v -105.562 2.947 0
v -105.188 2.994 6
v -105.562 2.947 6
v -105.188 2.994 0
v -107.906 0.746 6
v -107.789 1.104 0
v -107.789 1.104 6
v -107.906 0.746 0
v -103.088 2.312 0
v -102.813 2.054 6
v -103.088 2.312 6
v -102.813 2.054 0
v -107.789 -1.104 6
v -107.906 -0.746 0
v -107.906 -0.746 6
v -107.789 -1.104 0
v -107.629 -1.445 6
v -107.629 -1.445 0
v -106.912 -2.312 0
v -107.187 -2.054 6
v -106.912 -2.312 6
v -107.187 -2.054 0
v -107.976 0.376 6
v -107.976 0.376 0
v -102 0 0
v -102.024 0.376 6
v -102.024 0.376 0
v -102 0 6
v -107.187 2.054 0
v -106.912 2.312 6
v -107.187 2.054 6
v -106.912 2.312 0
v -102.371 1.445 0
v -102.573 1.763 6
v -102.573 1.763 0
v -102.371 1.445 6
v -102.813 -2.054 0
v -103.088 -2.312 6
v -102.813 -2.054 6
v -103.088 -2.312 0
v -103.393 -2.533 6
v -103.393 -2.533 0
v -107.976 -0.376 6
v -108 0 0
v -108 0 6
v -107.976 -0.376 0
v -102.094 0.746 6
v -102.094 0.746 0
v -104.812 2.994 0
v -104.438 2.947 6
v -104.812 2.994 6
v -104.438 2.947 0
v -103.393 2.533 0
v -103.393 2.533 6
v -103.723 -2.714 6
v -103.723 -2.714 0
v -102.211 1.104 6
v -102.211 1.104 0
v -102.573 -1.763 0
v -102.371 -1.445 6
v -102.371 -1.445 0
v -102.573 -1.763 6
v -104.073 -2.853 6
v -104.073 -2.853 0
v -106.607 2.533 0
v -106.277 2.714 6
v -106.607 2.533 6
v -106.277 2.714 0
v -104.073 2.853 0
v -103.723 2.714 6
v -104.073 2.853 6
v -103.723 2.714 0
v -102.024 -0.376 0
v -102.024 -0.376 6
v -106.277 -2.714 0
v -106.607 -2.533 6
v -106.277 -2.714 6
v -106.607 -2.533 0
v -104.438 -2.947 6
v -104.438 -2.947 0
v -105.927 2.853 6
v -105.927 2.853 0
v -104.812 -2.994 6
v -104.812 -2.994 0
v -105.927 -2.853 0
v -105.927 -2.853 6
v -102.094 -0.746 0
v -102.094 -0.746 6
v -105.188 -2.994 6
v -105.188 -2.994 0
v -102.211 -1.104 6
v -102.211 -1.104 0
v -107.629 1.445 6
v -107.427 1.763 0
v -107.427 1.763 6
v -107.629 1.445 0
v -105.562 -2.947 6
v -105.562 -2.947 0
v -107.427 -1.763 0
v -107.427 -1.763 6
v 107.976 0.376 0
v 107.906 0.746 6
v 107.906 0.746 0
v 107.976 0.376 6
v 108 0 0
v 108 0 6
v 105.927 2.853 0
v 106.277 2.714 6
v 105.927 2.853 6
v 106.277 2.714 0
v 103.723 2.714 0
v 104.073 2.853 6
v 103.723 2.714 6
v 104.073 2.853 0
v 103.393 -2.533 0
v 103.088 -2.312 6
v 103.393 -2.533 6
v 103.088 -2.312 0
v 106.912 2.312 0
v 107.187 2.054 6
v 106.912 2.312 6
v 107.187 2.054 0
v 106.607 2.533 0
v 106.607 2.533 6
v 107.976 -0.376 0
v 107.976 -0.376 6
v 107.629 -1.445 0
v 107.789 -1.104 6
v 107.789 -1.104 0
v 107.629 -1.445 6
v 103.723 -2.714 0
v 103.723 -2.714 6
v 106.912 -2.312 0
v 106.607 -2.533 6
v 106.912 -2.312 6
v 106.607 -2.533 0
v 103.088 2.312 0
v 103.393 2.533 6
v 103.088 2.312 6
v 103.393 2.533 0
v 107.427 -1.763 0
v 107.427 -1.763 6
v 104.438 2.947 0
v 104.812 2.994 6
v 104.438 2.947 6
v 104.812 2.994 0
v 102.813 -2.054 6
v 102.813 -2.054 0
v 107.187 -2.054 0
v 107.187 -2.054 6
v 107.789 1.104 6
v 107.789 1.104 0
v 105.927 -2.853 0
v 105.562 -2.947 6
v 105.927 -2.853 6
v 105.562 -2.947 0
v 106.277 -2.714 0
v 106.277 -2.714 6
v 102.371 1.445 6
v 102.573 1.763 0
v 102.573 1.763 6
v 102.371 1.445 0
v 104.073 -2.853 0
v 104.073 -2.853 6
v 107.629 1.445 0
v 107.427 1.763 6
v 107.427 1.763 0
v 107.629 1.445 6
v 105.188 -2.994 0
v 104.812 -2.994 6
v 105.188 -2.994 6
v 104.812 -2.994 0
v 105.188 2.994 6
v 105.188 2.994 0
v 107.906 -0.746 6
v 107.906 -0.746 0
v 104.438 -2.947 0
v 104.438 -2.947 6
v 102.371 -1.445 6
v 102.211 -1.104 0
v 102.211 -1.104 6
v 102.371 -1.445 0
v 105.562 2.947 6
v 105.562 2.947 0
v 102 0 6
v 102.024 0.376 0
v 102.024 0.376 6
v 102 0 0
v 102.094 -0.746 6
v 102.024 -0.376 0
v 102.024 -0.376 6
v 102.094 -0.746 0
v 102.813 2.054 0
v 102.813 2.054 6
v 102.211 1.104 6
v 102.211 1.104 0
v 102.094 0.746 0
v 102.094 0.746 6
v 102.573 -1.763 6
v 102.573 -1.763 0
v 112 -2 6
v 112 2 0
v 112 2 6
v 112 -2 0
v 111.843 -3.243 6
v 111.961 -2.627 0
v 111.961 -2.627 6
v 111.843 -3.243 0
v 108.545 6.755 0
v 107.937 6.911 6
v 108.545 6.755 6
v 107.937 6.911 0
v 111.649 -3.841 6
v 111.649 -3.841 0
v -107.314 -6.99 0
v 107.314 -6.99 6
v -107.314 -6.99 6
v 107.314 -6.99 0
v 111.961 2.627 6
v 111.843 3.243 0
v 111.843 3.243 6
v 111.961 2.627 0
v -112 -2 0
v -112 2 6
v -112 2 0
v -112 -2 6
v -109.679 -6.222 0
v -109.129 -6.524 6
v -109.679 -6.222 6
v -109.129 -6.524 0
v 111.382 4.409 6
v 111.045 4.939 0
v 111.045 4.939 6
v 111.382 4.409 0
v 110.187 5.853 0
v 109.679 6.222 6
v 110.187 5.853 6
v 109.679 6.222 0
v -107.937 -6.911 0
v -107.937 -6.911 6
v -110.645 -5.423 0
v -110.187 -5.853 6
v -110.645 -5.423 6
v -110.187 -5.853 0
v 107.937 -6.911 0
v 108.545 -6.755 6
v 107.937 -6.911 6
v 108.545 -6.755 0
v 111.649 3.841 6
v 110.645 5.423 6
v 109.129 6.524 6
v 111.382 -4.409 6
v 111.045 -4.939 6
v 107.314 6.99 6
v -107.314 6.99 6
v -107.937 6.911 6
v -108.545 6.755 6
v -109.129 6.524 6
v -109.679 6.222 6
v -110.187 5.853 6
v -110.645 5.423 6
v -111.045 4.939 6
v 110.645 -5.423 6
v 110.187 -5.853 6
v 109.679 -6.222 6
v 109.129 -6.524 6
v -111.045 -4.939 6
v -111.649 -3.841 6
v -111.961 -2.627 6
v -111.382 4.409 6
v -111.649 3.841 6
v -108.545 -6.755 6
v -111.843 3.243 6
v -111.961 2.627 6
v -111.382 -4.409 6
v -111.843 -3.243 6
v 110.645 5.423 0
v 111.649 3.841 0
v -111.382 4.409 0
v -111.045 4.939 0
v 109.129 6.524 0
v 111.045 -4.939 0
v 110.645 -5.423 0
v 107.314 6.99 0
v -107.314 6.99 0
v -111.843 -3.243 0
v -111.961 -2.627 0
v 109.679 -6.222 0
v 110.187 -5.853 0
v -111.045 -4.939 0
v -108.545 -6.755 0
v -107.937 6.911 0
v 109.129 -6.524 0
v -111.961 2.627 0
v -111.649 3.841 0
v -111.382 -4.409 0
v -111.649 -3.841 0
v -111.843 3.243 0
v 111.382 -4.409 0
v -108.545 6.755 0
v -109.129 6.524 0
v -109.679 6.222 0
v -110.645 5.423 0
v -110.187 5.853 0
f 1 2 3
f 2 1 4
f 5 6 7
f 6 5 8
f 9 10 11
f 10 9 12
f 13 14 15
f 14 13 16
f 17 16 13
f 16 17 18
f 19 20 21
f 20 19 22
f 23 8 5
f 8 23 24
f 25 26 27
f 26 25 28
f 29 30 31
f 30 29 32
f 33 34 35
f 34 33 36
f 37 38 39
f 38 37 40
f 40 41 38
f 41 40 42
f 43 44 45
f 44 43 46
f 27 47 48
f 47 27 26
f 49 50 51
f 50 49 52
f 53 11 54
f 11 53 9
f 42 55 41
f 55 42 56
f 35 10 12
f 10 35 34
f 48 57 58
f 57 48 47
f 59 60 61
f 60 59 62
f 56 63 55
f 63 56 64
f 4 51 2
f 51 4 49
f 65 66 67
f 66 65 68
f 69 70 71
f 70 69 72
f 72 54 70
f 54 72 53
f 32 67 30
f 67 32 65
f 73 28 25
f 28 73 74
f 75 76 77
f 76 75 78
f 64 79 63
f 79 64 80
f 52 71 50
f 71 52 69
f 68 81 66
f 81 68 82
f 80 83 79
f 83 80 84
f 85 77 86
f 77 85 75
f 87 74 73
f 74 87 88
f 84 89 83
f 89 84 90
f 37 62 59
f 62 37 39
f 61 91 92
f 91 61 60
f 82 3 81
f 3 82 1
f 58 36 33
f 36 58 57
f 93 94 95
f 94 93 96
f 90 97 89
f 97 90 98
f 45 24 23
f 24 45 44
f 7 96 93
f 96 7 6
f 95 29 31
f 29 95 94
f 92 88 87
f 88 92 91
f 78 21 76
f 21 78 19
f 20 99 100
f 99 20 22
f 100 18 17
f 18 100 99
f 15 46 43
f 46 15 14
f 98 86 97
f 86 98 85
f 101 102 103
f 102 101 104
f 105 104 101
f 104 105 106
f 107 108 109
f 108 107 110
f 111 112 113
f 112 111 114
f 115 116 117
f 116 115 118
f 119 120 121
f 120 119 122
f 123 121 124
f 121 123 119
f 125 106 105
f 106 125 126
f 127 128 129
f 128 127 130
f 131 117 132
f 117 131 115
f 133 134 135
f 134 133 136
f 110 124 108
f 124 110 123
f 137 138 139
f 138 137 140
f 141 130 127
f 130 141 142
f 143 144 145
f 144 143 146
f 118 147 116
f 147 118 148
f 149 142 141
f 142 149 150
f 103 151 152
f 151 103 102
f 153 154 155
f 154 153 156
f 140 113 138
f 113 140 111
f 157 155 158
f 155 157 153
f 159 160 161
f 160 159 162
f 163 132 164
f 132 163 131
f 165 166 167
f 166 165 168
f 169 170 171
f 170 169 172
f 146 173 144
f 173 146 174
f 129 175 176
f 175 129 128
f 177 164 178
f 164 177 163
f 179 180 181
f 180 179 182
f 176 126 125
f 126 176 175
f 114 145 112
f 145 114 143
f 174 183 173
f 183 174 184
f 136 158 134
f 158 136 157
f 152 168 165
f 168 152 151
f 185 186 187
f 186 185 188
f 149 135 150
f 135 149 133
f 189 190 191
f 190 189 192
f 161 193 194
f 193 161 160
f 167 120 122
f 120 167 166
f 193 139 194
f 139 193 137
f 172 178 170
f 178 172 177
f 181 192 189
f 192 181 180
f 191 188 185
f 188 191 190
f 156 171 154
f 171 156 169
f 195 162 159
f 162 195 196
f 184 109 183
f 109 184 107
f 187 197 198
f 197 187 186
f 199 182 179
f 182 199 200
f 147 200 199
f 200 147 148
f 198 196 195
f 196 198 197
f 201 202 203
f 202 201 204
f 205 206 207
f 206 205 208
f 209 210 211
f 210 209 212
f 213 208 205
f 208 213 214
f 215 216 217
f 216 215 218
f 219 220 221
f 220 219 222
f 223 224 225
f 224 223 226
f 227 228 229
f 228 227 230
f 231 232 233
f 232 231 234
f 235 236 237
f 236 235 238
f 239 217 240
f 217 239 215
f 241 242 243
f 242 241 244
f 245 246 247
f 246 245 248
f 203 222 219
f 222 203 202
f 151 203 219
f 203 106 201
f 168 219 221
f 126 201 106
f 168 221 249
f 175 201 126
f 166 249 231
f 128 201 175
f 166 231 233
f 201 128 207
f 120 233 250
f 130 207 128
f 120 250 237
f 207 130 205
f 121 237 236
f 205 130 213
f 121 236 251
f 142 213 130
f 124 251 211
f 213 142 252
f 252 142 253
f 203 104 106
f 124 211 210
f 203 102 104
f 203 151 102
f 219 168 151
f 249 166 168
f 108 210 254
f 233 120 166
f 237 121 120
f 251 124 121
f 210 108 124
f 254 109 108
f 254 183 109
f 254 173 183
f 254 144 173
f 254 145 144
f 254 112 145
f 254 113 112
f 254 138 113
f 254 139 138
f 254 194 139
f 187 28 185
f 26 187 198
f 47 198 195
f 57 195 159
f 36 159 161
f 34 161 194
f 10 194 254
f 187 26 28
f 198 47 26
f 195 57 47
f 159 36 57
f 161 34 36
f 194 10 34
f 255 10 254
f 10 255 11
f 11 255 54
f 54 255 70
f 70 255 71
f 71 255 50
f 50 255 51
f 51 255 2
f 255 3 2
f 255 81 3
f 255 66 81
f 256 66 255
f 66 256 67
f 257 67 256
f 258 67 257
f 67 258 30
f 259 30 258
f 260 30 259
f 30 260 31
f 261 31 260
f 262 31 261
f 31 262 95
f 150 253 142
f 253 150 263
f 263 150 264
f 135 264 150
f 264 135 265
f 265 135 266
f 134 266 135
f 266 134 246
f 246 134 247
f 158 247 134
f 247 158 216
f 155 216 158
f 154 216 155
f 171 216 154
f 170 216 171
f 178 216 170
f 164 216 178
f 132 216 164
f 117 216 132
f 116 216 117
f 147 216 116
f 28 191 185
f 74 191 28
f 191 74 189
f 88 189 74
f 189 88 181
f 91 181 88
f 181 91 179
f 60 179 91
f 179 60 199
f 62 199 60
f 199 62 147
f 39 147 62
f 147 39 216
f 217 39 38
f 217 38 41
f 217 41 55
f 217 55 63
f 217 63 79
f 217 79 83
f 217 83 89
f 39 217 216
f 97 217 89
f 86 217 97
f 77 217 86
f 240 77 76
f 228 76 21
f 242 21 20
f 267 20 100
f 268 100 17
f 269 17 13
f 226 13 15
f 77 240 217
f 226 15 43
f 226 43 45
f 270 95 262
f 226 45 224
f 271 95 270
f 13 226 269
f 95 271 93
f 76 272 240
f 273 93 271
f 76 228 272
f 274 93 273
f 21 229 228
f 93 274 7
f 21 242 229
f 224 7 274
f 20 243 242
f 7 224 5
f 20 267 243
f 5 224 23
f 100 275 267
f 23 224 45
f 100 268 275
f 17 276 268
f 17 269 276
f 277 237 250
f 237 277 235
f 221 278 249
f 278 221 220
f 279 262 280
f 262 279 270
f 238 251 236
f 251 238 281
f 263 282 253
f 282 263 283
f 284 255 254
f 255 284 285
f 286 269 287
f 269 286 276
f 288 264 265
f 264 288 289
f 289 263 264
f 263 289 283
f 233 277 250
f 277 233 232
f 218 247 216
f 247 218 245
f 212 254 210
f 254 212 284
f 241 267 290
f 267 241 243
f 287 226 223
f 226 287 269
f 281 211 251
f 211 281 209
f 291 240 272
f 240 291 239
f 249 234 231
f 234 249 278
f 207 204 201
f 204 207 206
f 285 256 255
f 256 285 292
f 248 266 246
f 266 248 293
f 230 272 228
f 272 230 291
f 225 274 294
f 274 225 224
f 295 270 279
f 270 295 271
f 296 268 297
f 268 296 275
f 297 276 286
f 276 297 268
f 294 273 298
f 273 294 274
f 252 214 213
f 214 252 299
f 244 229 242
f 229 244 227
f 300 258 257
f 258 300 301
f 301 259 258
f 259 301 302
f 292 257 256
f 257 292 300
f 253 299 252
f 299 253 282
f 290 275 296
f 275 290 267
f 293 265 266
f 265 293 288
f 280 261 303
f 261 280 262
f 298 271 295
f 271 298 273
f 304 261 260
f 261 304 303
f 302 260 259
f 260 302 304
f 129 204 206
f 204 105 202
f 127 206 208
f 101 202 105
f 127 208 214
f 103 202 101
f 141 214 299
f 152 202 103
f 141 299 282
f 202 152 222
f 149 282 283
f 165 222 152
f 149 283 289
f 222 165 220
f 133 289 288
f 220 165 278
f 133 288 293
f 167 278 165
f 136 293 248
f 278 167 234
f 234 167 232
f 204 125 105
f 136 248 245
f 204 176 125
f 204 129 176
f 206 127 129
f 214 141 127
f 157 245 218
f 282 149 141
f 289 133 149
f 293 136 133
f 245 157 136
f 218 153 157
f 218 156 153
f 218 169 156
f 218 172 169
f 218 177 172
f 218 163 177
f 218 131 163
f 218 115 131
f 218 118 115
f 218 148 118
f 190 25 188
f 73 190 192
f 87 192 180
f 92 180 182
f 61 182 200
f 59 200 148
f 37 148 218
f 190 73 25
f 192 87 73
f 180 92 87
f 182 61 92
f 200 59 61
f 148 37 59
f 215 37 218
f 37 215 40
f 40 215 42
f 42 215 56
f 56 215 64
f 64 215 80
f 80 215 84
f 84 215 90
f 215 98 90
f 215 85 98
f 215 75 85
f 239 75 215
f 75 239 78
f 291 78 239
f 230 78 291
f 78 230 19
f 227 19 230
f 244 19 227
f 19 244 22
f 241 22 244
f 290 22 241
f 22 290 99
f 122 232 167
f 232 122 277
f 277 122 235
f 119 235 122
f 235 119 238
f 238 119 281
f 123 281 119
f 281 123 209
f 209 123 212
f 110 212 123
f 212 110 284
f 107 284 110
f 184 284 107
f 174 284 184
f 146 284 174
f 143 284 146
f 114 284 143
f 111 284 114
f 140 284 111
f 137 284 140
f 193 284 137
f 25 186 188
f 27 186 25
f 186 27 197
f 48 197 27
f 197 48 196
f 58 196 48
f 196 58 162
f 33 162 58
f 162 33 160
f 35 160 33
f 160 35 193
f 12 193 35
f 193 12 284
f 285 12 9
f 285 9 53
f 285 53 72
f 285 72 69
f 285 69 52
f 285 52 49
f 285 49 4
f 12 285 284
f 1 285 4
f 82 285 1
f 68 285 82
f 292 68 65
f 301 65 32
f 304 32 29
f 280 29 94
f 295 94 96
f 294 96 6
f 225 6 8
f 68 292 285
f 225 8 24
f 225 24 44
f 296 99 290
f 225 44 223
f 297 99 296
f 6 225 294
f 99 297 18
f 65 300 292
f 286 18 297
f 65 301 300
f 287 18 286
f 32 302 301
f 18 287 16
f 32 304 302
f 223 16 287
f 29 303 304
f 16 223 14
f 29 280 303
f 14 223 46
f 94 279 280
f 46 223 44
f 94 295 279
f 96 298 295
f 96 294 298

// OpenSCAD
$fn = 50;


difference() {
	union() {
		hull() {
			translate(v = [-107.0000000000, 2.0000000000, 0]) {
				cylinder(h = 6, r = 5);
			}
			translate(v = [107.0000000000, 2.0000000000, 0]) {
				cylinder(h = 6, r = 5);
			}
			translate(v = [-107.0000000000, -2.0000000000, 0]) {
				cylinder(h = 6, r = 5);
			}
			translate(v = [107.0000000000, -2.0000000000, 0]) {
				cylinder(h = 6, r = 5);
			}
		}
	}
	union() {
		translate(v = [-105.0000000000, 0.0000000000, -100.0000000000]) {
			cylinder(h = 200, r = 3.0000000000);
		}
		translate(v = [-105.0000000000, 0.0000000000, -100.0000000000]) {
			cylinder(h = 200, r = 3.0000000000);
		}
		translate(v = [105.0000000000, 0.0000000000, -100.0000000000]) {
			cylinder(h = 200, r = 3.0000000000);
		}
		translate(v = [105.0000000000, 0.0000000000, -100.0000000000]) {
			cylinder(h = 200, r = 3.0000000000);
		}
	}
}
